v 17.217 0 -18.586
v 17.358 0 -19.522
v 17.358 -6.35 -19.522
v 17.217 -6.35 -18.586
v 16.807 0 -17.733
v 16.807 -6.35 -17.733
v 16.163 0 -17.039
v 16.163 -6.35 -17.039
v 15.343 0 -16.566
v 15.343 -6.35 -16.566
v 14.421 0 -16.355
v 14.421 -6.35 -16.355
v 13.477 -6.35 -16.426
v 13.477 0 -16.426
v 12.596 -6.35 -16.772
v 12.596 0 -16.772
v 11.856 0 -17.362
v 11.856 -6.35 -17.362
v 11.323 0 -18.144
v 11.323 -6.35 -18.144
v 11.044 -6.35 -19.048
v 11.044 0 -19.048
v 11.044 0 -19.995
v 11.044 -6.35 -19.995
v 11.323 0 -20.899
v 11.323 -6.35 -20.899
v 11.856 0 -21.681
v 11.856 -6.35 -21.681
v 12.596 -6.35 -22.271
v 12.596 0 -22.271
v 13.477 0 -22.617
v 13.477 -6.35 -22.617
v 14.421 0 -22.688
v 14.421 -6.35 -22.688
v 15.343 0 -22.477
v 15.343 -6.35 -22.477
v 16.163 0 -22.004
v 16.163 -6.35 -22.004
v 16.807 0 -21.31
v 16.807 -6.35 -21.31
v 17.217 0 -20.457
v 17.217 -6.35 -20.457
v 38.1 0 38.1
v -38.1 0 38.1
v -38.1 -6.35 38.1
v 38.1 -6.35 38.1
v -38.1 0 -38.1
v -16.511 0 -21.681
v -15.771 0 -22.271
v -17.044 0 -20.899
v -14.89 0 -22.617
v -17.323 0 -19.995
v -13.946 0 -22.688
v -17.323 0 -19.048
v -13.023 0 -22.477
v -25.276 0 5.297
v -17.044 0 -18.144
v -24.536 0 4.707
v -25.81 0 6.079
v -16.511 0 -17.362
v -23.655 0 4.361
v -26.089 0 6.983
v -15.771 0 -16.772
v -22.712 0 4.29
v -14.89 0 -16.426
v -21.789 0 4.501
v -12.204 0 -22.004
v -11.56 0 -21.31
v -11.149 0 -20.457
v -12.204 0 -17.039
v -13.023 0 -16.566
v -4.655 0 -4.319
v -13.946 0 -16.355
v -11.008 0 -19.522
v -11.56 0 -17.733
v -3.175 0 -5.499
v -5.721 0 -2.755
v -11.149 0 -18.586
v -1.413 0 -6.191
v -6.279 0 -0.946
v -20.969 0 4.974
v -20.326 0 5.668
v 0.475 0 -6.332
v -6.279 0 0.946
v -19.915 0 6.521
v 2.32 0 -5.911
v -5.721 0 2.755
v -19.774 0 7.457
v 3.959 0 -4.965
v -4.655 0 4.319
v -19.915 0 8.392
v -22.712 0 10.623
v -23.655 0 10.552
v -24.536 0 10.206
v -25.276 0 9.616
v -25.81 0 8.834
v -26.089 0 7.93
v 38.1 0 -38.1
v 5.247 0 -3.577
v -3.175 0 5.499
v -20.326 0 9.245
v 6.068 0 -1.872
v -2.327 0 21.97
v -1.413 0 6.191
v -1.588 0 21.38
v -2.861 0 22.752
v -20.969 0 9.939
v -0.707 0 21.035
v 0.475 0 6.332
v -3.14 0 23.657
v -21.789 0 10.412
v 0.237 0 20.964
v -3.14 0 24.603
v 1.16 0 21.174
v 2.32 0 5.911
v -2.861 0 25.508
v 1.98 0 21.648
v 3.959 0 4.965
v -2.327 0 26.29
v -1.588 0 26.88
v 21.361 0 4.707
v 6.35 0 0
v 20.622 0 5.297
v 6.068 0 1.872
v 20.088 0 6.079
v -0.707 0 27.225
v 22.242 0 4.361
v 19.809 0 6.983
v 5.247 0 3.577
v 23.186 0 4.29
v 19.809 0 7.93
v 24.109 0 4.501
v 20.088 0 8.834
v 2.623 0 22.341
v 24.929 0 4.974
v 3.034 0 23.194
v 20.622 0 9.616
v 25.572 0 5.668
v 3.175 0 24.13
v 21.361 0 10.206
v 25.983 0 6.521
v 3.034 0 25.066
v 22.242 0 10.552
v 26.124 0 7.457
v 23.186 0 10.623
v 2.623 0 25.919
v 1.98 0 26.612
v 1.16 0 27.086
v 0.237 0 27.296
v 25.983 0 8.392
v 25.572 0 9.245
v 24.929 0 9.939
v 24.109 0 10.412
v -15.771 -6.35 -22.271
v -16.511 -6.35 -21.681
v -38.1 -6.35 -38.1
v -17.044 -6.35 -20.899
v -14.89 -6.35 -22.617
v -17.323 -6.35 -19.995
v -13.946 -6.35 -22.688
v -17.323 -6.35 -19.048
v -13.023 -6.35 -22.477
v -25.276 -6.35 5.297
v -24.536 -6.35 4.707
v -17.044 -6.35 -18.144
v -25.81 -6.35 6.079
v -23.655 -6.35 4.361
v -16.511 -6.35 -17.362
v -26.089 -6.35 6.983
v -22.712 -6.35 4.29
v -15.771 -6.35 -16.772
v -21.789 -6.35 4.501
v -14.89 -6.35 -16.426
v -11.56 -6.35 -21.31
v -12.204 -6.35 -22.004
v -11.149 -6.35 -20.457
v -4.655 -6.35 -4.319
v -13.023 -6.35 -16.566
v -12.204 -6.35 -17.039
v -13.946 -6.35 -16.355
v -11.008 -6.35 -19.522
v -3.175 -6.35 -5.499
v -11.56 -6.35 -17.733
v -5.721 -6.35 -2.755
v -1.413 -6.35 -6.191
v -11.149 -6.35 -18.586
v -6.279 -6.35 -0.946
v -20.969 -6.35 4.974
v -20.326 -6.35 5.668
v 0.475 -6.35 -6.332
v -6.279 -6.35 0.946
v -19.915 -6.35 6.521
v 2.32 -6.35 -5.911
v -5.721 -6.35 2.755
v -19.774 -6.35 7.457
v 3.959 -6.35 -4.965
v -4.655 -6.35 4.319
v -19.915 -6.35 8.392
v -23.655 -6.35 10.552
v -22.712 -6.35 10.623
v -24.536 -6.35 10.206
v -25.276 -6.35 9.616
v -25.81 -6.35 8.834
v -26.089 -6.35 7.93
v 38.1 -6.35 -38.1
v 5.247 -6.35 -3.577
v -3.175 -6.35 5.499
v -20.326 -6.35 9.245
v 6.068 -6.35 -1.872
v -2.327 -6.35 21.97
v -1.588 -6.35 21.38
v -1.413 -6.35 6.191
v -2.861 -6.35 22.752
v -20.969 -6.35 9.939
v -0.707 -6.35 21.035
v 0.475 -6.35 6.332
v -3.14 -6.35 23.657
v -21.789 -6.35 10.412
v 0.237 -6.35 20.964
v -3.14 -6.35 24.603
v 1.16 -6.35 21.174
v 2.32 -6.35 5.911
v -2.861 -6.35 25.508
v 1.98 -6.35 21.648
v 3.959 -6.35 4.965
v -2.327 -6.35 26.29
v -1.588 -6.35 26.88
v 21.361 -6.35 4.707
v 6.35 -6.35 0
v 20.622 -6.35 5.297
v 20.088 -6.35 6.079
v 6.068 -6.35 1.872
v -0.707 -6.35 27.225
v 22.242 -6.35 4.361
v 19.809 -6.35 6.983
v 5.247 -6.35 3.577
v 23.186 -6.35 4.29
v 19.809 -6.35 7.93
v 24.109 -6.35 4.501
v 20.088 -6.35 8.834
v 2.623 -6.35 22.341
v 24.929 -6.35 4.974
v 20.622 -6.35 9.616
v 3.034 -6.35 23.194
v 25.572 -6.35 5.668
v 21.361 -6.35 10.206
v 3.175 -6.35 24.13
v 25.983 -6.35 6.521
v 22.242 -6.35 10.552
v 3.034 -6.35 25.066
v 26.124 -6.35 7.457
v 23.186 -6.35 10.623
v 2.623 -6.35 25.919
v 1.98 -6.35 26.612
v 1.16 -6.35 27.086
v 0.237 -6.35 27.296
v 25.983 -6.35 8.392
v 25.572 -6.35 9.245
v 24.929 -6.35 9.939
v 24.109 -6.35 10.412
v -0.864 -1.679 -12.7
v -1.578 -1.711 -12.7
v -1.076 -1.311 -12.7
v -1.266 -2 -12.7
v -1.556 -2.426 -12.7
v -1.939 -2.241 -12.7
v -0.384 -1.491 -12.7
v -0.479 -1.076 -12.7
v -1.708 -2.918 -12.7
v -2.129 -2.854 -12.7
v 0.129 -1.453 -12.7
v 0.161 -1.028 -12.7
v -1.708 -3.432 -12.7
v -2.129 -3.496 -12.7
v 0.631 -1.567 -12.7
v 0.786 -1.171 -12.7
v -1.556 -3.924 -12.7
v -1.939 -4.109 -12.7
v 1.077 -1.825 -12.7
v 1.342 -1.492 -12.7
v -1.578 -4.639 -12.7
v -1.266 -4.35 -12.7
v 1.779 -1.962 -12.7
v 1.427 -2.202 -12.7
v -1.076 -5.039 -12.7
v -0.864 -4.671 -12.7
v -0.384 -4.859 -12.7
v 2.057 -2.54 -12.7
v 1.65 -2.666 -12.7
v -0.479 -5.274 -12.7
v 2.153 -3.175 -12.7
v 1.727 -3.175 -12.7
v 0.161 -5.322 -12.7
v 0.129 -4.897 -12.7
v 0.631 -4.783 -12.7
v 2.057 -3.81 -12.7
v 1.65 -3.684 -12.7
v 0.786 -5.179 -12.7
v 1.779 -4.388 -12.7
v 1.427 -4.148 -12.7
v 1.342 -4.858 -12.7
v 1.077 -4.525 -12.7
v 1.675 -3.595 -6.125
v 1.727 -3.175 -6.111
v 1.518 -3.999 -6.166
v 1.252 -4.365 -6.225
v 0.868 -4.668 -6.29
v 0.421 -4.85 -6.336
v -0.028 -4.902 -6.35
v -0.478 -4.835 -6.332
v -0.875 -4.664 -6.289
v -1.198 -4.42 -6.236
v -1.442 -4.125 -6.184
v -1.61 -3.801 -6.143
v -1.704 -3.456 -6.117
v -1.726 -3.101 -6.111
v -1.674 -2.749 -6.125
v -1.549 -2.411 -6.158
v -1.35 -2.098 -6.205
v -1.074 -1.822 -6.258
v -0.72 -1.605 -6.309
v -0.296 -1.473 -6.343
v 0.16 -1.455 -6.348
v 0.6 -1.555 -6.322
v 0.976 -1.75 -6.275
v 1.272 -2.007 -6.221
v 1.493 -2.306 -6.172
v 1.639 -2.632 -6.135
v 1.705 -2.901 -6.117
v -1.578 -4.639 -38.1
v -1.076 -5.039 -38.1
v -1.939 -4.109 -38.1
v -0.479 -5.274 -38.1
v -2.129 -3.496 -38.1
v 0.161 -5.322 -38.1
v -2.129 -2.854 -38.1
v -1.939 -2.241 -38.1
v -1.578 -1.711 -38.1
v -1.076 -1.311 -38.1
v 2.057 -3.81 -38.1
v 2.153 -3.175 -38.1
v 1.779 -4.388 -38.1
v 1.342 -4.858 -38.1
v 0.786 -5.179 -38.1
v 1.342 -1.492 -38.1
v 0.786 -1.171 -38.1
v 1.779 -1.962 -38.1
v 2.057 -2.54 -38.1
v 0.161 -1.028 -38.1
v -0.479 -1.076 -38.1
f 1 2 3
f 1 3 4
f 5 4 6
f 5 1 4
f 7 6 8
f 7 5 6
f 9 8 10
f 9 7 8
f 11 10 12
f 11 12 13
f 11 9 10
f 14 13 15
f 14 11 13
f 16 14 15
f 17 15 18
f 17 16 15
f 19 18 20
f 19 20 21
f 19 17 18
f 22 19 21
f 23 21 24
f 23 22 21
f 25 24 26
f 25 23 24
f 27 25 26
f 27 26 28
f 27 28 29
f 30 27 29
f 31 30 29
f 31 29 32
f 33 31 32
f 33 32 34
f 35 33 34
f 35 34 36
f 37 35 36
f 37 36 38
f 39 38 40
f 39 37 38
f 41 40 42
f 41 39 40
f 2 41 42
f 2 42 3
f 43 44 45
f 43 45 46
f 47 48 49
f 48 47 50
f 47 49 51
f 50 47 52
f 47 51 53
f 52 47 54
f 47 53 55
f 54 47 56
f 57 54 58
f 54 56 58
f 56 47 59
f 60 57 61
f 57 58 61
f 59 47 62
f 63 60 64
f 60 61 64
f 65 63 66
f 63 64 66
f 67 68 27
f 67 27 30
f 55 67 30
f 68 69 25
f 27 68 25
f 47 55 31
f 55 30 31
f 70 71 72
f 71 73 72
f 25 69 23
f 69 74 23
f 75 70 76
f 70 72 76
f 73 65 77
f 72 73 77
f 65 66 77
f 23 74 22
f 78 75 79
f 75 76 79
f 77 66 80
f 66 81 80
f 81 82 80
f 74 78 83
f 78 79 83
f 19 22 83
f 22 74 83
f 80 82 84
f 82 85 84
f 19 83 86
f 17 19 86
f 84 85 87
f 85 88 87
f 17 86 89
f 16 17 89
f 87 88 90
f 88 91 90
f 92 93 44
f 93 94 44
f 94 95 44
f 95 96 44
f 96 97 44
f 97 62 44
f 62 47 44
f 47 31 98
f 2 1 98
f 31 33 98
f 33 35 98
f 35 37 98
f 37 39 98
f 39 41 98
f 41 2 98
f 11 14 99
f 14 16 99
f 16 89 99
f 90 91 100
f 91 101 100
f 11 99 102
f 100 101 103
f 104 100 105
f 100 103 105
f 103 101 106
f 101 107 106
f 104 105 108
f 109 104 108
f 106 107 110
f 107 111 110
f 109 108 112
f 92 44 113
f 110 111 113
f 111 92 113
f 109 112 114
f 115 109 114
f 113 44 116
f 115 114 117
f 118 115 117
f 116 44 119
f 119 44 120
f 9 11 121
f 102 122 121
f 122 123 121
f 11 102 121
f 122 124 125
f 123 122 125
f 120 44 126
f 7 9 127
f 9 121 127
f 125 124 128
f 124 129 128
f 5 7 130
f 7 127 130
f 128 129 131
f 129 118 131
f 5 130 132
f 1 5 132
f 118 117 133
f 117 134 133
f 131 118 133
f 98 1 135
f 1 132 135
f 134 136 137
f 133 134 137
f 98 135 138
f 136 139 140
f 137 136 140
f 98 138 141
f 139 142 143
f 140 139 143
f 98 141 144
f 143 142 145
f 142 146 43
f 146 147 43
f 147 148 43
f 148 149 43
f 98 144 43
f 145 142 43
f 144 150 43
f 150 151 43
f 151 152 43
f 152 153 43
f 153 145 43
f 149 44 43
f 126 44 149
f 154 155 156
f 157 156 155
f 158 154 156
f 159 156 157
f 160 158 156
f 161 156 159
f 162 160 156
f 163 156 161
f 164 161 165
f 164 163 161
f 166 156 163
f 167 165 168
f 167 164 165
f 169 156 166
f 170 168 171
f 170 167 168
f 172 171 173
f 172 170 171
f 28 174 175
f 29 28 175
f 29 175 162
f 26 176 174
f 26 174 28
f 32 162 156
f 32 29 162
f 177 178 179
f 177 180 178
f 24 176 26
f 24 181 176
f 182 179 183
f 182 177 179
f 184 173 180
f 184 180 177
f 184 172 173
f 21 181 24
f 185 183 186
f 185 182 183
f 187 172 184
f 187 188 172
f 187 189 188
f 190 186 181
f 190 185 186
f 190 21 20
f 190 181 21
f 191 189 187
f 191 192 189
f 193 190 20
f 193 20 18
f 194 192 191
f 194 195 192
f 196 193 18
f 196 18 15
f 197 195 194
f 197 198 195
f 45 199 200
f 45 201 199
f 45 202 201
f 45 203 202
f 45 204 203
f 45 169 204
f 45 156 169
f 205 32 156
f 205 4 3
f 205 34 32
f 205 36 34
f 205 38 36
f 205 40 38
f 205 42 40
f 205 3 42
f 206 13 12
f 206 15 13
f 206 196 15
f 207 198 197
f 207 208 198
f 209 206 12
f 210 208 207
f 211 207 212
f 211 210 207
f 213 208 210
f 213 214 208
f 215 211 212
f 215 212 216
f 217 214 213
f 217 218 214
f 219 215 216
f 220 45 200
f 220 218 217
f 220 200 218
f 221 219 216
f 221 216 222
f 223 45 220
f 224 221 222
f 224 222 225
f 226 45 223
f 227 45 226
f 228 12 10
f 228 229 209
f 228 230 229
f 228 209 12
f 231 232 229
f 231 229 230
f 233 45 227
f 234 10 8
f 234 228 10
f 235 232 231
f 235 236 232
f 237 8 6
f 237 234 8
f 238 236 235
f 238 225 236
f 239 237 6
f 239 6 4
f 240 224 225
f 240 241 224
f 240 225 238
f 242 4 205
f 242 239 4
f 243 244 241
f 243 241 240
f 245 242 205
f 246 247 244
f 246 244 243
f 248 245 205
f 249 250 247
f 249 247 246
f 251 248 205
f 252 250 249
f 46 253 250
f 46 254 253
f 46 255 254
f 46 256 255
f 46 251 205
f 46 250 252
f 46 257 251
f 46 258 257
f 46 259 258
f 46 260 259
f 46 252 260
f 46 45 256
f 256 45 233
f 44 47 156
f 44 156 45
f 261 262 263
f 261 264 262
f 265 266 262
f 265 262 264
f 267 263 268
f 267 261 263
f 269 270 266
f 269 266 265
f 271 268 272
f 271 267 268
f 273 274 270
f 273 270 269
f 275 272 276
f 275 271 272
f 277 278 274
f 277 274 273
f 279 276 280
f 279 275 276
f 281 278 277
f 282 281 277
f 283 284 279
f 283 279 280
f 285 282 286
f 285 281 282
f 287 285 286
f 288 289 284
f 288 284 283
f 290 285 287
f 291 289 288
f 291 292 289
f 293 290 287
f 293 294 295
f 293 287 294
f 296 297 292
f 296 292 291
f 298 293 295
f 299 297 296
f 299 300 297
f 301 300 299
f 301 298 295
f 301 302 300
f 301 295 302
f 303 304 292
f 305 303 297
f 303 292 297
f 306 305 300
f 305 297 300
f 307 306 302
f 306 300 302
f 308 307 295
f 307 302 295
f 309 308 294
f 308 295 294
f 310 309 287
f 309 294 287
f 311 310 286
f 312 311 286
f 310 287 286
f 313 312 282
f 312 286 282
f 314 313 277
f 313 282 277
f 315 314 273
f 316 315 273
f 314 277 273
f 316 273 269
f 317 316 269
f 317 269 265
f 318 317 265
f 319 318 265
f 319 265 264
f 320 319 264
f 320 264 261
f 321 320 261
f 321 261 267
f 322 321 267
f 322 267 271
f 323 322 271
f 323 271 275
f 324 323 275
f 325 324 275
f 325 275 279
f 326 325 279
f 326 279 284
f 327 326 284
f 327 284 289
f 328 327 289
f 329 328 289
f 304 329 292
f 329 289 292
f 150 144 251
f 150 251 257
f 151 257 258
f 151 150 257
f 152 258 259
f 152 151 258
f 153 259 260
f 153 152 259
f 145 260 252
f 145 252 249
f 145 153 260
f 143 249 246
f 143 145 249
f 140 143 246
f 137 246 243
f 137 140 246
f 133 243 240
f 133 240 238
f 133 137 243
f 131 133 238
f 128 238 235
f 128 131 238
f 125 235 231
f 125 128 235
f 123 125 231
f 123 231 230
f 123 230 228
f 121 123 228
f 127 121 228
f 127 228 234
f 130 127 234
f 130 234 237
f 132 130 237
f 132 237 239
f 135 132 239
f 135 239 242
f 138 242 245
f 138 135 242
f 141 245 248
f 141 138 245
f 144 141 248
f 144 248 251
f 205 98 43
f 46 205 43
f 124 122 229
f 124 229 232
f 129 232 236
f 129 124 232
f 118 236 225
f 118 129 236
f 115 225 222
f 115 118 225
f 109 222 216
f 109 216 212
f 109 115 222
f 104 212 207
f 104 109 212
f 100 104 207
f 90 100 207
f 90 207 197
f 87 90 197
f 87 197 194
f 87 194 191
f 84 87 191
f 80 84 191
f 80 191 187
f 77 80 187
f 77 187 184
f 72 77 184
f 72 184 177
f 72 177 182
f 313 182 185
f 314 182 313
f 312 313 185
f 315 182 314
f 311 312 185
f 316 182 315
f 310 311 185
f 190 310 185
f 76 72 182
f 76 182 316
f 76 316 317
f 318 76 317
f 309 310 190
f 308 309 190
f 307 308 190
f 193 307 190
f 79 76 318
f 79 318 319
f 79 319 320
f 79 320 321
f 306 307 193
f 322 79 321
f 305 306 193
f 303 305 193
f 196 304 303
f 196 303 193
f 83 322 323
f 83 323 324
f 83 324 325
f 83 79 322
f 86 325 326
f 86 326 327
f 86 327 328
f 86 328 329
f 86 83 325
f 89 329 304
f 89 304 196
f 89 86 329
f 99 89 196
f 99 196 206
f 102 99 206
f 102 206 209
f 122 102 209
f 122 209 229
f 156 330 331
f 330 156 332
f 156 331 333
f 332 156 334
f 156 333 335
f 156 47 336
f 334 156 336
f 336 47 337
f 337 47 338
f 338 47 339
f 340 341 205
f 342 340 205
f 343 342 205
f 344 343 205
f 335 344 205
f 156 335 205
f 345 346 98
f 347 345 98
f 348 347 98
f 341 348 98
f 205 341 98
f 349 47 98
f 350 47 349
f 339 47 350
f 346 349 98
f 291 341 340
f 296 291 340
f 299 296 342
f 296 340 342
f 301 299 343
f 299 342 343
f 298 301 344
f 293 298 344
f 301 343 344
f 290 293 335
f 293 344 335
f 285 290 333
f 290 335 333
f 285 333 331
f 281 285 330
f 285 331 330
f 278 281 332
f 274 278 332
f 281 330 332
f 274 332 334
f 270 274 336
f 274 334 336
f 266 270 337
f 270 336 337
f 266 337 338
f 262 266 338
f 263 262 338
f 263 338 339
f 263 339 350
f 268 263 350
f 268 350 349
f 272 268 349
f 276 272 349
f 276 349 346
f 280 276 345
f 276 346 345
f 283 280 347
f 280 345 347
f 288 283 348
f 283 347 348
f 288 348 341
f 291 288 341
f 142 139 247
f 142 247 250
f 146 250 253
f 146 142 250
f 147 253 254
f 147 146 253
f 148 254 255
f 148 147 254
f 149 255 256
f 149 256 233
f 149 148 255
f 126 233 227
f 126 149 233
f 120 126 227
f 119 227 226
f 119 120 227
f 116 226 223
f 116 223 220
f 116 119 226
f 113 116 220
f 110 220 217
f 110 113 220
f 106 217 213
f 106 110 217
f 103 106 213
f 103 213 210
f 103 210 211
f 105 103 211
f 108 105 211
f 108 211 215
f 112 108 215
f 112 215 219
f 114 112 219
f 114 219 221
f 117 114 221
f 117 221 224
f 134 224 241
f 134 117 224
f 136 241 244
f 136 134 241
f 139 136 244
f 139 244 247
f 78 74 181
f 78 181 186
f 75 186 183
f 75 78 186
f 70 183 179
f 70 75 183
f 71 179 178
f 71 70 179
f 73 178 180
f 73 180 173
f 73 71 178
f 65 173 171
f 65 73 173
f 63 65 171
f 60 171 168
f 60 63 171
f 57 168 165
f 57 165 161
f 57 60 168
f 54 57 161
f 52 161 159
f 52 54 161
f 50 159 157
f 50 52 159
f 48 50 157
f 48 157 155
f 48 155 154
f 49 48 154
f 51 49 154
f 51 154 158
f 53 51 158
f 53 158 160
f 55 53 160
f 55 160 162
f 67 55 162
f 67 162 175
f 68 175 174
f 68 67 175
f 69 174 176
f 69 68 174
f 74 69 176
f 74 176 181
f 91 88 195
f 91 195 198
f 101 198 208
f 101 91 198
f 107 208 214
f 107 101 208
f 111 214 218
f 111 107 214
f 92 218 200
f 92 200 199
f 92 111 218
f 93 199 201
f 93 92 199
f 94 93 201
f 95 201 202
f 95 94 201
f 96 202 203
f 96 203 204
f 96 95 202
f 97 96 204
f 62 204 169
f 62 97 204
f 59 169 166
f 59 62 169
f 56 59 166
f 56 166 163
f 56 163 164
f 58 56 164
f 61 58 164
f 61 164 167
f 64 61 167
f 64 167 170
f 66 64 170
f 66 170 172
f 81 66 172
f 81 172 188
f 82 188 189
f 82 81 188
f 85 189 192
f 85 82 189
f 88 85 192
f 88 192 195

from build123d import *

# Parameters (mm, degrees)
F0_W     = 76.2
F0_H     = 76.2
F0_R     = 3.175
F0_R_2   = 6.35
F1_DEPTH = 6.35
F2_R     = 2.15265
F3_DEPTH = 25.4
F4_R     = 1.7272
F5_REACH = 81.0862593299


with BuildPart() as f1:
    # F0 (on Front) → F1 (new body)
    with BuildSketch(Plane.XZ):
        Rectangle(F0_W, F0_H)
        with Locations((-14.1832581378, -19.5215800743)):
            Circle(F0_R, mode=Mode.SUBTRACT)
        with Locations((14.1832581378, -19.5215800743)):
            Circle(F0_R, mode=Mode.SUBTRACT)
        with Locations((-22.9489937382, 7.4565800743)):
            Circle(F0_R, mode=Mode.SUBTRACT)
        Circle(F0_R_2, mode=Mode.SUBTRACT)
        with Locations((22.9489937382, 7.4565800743)):
            Circle(F0_R, mode=Mode.SUBTRACT)
        with Locations((0, 24.13)):
            Circle(F0_R, mode=Mode.SUBTRACT)
    extrude(amount=F1_DEPTH)

    # F2 (on face) → F3 (cut)
    with BuildSketch(Plane(origin=(0, 0, -38.1), x_dir=(1, 0, 0), z_dir=(0, 0, -1))):
        with Locations((0, 3.175)):
            Circle(F2_R)
    extrude(amount=-F3_DEPTH, mode=Mode.SUBTRACT)

    f5_end = f1.faces().sort_by_distance((-6.35, -3.175, 0))[0]
    # F4 (on face) → F5 (cut, up to a face of the model that its end follows)
    with BuildSketch(Plane(origin=(0, 0, -38.1), x_dir=(1, 0, 0), z_dir=(0, 0, -1))):
        with Locations((0, 3.175)):
            Circle(F4_R)
    f5_long = extrude(amount=-F5_REACH, mode=Mode.PRIVATE)
    add(split(f5_long, bisect_by=f5_end, keep=Keep.ALL, mode=Mode.PRIVATE).solids().sort_by_distance((0, -3.175, -38.1))[0], mode=Mode.SUBTRACT)


solid = f1.part
